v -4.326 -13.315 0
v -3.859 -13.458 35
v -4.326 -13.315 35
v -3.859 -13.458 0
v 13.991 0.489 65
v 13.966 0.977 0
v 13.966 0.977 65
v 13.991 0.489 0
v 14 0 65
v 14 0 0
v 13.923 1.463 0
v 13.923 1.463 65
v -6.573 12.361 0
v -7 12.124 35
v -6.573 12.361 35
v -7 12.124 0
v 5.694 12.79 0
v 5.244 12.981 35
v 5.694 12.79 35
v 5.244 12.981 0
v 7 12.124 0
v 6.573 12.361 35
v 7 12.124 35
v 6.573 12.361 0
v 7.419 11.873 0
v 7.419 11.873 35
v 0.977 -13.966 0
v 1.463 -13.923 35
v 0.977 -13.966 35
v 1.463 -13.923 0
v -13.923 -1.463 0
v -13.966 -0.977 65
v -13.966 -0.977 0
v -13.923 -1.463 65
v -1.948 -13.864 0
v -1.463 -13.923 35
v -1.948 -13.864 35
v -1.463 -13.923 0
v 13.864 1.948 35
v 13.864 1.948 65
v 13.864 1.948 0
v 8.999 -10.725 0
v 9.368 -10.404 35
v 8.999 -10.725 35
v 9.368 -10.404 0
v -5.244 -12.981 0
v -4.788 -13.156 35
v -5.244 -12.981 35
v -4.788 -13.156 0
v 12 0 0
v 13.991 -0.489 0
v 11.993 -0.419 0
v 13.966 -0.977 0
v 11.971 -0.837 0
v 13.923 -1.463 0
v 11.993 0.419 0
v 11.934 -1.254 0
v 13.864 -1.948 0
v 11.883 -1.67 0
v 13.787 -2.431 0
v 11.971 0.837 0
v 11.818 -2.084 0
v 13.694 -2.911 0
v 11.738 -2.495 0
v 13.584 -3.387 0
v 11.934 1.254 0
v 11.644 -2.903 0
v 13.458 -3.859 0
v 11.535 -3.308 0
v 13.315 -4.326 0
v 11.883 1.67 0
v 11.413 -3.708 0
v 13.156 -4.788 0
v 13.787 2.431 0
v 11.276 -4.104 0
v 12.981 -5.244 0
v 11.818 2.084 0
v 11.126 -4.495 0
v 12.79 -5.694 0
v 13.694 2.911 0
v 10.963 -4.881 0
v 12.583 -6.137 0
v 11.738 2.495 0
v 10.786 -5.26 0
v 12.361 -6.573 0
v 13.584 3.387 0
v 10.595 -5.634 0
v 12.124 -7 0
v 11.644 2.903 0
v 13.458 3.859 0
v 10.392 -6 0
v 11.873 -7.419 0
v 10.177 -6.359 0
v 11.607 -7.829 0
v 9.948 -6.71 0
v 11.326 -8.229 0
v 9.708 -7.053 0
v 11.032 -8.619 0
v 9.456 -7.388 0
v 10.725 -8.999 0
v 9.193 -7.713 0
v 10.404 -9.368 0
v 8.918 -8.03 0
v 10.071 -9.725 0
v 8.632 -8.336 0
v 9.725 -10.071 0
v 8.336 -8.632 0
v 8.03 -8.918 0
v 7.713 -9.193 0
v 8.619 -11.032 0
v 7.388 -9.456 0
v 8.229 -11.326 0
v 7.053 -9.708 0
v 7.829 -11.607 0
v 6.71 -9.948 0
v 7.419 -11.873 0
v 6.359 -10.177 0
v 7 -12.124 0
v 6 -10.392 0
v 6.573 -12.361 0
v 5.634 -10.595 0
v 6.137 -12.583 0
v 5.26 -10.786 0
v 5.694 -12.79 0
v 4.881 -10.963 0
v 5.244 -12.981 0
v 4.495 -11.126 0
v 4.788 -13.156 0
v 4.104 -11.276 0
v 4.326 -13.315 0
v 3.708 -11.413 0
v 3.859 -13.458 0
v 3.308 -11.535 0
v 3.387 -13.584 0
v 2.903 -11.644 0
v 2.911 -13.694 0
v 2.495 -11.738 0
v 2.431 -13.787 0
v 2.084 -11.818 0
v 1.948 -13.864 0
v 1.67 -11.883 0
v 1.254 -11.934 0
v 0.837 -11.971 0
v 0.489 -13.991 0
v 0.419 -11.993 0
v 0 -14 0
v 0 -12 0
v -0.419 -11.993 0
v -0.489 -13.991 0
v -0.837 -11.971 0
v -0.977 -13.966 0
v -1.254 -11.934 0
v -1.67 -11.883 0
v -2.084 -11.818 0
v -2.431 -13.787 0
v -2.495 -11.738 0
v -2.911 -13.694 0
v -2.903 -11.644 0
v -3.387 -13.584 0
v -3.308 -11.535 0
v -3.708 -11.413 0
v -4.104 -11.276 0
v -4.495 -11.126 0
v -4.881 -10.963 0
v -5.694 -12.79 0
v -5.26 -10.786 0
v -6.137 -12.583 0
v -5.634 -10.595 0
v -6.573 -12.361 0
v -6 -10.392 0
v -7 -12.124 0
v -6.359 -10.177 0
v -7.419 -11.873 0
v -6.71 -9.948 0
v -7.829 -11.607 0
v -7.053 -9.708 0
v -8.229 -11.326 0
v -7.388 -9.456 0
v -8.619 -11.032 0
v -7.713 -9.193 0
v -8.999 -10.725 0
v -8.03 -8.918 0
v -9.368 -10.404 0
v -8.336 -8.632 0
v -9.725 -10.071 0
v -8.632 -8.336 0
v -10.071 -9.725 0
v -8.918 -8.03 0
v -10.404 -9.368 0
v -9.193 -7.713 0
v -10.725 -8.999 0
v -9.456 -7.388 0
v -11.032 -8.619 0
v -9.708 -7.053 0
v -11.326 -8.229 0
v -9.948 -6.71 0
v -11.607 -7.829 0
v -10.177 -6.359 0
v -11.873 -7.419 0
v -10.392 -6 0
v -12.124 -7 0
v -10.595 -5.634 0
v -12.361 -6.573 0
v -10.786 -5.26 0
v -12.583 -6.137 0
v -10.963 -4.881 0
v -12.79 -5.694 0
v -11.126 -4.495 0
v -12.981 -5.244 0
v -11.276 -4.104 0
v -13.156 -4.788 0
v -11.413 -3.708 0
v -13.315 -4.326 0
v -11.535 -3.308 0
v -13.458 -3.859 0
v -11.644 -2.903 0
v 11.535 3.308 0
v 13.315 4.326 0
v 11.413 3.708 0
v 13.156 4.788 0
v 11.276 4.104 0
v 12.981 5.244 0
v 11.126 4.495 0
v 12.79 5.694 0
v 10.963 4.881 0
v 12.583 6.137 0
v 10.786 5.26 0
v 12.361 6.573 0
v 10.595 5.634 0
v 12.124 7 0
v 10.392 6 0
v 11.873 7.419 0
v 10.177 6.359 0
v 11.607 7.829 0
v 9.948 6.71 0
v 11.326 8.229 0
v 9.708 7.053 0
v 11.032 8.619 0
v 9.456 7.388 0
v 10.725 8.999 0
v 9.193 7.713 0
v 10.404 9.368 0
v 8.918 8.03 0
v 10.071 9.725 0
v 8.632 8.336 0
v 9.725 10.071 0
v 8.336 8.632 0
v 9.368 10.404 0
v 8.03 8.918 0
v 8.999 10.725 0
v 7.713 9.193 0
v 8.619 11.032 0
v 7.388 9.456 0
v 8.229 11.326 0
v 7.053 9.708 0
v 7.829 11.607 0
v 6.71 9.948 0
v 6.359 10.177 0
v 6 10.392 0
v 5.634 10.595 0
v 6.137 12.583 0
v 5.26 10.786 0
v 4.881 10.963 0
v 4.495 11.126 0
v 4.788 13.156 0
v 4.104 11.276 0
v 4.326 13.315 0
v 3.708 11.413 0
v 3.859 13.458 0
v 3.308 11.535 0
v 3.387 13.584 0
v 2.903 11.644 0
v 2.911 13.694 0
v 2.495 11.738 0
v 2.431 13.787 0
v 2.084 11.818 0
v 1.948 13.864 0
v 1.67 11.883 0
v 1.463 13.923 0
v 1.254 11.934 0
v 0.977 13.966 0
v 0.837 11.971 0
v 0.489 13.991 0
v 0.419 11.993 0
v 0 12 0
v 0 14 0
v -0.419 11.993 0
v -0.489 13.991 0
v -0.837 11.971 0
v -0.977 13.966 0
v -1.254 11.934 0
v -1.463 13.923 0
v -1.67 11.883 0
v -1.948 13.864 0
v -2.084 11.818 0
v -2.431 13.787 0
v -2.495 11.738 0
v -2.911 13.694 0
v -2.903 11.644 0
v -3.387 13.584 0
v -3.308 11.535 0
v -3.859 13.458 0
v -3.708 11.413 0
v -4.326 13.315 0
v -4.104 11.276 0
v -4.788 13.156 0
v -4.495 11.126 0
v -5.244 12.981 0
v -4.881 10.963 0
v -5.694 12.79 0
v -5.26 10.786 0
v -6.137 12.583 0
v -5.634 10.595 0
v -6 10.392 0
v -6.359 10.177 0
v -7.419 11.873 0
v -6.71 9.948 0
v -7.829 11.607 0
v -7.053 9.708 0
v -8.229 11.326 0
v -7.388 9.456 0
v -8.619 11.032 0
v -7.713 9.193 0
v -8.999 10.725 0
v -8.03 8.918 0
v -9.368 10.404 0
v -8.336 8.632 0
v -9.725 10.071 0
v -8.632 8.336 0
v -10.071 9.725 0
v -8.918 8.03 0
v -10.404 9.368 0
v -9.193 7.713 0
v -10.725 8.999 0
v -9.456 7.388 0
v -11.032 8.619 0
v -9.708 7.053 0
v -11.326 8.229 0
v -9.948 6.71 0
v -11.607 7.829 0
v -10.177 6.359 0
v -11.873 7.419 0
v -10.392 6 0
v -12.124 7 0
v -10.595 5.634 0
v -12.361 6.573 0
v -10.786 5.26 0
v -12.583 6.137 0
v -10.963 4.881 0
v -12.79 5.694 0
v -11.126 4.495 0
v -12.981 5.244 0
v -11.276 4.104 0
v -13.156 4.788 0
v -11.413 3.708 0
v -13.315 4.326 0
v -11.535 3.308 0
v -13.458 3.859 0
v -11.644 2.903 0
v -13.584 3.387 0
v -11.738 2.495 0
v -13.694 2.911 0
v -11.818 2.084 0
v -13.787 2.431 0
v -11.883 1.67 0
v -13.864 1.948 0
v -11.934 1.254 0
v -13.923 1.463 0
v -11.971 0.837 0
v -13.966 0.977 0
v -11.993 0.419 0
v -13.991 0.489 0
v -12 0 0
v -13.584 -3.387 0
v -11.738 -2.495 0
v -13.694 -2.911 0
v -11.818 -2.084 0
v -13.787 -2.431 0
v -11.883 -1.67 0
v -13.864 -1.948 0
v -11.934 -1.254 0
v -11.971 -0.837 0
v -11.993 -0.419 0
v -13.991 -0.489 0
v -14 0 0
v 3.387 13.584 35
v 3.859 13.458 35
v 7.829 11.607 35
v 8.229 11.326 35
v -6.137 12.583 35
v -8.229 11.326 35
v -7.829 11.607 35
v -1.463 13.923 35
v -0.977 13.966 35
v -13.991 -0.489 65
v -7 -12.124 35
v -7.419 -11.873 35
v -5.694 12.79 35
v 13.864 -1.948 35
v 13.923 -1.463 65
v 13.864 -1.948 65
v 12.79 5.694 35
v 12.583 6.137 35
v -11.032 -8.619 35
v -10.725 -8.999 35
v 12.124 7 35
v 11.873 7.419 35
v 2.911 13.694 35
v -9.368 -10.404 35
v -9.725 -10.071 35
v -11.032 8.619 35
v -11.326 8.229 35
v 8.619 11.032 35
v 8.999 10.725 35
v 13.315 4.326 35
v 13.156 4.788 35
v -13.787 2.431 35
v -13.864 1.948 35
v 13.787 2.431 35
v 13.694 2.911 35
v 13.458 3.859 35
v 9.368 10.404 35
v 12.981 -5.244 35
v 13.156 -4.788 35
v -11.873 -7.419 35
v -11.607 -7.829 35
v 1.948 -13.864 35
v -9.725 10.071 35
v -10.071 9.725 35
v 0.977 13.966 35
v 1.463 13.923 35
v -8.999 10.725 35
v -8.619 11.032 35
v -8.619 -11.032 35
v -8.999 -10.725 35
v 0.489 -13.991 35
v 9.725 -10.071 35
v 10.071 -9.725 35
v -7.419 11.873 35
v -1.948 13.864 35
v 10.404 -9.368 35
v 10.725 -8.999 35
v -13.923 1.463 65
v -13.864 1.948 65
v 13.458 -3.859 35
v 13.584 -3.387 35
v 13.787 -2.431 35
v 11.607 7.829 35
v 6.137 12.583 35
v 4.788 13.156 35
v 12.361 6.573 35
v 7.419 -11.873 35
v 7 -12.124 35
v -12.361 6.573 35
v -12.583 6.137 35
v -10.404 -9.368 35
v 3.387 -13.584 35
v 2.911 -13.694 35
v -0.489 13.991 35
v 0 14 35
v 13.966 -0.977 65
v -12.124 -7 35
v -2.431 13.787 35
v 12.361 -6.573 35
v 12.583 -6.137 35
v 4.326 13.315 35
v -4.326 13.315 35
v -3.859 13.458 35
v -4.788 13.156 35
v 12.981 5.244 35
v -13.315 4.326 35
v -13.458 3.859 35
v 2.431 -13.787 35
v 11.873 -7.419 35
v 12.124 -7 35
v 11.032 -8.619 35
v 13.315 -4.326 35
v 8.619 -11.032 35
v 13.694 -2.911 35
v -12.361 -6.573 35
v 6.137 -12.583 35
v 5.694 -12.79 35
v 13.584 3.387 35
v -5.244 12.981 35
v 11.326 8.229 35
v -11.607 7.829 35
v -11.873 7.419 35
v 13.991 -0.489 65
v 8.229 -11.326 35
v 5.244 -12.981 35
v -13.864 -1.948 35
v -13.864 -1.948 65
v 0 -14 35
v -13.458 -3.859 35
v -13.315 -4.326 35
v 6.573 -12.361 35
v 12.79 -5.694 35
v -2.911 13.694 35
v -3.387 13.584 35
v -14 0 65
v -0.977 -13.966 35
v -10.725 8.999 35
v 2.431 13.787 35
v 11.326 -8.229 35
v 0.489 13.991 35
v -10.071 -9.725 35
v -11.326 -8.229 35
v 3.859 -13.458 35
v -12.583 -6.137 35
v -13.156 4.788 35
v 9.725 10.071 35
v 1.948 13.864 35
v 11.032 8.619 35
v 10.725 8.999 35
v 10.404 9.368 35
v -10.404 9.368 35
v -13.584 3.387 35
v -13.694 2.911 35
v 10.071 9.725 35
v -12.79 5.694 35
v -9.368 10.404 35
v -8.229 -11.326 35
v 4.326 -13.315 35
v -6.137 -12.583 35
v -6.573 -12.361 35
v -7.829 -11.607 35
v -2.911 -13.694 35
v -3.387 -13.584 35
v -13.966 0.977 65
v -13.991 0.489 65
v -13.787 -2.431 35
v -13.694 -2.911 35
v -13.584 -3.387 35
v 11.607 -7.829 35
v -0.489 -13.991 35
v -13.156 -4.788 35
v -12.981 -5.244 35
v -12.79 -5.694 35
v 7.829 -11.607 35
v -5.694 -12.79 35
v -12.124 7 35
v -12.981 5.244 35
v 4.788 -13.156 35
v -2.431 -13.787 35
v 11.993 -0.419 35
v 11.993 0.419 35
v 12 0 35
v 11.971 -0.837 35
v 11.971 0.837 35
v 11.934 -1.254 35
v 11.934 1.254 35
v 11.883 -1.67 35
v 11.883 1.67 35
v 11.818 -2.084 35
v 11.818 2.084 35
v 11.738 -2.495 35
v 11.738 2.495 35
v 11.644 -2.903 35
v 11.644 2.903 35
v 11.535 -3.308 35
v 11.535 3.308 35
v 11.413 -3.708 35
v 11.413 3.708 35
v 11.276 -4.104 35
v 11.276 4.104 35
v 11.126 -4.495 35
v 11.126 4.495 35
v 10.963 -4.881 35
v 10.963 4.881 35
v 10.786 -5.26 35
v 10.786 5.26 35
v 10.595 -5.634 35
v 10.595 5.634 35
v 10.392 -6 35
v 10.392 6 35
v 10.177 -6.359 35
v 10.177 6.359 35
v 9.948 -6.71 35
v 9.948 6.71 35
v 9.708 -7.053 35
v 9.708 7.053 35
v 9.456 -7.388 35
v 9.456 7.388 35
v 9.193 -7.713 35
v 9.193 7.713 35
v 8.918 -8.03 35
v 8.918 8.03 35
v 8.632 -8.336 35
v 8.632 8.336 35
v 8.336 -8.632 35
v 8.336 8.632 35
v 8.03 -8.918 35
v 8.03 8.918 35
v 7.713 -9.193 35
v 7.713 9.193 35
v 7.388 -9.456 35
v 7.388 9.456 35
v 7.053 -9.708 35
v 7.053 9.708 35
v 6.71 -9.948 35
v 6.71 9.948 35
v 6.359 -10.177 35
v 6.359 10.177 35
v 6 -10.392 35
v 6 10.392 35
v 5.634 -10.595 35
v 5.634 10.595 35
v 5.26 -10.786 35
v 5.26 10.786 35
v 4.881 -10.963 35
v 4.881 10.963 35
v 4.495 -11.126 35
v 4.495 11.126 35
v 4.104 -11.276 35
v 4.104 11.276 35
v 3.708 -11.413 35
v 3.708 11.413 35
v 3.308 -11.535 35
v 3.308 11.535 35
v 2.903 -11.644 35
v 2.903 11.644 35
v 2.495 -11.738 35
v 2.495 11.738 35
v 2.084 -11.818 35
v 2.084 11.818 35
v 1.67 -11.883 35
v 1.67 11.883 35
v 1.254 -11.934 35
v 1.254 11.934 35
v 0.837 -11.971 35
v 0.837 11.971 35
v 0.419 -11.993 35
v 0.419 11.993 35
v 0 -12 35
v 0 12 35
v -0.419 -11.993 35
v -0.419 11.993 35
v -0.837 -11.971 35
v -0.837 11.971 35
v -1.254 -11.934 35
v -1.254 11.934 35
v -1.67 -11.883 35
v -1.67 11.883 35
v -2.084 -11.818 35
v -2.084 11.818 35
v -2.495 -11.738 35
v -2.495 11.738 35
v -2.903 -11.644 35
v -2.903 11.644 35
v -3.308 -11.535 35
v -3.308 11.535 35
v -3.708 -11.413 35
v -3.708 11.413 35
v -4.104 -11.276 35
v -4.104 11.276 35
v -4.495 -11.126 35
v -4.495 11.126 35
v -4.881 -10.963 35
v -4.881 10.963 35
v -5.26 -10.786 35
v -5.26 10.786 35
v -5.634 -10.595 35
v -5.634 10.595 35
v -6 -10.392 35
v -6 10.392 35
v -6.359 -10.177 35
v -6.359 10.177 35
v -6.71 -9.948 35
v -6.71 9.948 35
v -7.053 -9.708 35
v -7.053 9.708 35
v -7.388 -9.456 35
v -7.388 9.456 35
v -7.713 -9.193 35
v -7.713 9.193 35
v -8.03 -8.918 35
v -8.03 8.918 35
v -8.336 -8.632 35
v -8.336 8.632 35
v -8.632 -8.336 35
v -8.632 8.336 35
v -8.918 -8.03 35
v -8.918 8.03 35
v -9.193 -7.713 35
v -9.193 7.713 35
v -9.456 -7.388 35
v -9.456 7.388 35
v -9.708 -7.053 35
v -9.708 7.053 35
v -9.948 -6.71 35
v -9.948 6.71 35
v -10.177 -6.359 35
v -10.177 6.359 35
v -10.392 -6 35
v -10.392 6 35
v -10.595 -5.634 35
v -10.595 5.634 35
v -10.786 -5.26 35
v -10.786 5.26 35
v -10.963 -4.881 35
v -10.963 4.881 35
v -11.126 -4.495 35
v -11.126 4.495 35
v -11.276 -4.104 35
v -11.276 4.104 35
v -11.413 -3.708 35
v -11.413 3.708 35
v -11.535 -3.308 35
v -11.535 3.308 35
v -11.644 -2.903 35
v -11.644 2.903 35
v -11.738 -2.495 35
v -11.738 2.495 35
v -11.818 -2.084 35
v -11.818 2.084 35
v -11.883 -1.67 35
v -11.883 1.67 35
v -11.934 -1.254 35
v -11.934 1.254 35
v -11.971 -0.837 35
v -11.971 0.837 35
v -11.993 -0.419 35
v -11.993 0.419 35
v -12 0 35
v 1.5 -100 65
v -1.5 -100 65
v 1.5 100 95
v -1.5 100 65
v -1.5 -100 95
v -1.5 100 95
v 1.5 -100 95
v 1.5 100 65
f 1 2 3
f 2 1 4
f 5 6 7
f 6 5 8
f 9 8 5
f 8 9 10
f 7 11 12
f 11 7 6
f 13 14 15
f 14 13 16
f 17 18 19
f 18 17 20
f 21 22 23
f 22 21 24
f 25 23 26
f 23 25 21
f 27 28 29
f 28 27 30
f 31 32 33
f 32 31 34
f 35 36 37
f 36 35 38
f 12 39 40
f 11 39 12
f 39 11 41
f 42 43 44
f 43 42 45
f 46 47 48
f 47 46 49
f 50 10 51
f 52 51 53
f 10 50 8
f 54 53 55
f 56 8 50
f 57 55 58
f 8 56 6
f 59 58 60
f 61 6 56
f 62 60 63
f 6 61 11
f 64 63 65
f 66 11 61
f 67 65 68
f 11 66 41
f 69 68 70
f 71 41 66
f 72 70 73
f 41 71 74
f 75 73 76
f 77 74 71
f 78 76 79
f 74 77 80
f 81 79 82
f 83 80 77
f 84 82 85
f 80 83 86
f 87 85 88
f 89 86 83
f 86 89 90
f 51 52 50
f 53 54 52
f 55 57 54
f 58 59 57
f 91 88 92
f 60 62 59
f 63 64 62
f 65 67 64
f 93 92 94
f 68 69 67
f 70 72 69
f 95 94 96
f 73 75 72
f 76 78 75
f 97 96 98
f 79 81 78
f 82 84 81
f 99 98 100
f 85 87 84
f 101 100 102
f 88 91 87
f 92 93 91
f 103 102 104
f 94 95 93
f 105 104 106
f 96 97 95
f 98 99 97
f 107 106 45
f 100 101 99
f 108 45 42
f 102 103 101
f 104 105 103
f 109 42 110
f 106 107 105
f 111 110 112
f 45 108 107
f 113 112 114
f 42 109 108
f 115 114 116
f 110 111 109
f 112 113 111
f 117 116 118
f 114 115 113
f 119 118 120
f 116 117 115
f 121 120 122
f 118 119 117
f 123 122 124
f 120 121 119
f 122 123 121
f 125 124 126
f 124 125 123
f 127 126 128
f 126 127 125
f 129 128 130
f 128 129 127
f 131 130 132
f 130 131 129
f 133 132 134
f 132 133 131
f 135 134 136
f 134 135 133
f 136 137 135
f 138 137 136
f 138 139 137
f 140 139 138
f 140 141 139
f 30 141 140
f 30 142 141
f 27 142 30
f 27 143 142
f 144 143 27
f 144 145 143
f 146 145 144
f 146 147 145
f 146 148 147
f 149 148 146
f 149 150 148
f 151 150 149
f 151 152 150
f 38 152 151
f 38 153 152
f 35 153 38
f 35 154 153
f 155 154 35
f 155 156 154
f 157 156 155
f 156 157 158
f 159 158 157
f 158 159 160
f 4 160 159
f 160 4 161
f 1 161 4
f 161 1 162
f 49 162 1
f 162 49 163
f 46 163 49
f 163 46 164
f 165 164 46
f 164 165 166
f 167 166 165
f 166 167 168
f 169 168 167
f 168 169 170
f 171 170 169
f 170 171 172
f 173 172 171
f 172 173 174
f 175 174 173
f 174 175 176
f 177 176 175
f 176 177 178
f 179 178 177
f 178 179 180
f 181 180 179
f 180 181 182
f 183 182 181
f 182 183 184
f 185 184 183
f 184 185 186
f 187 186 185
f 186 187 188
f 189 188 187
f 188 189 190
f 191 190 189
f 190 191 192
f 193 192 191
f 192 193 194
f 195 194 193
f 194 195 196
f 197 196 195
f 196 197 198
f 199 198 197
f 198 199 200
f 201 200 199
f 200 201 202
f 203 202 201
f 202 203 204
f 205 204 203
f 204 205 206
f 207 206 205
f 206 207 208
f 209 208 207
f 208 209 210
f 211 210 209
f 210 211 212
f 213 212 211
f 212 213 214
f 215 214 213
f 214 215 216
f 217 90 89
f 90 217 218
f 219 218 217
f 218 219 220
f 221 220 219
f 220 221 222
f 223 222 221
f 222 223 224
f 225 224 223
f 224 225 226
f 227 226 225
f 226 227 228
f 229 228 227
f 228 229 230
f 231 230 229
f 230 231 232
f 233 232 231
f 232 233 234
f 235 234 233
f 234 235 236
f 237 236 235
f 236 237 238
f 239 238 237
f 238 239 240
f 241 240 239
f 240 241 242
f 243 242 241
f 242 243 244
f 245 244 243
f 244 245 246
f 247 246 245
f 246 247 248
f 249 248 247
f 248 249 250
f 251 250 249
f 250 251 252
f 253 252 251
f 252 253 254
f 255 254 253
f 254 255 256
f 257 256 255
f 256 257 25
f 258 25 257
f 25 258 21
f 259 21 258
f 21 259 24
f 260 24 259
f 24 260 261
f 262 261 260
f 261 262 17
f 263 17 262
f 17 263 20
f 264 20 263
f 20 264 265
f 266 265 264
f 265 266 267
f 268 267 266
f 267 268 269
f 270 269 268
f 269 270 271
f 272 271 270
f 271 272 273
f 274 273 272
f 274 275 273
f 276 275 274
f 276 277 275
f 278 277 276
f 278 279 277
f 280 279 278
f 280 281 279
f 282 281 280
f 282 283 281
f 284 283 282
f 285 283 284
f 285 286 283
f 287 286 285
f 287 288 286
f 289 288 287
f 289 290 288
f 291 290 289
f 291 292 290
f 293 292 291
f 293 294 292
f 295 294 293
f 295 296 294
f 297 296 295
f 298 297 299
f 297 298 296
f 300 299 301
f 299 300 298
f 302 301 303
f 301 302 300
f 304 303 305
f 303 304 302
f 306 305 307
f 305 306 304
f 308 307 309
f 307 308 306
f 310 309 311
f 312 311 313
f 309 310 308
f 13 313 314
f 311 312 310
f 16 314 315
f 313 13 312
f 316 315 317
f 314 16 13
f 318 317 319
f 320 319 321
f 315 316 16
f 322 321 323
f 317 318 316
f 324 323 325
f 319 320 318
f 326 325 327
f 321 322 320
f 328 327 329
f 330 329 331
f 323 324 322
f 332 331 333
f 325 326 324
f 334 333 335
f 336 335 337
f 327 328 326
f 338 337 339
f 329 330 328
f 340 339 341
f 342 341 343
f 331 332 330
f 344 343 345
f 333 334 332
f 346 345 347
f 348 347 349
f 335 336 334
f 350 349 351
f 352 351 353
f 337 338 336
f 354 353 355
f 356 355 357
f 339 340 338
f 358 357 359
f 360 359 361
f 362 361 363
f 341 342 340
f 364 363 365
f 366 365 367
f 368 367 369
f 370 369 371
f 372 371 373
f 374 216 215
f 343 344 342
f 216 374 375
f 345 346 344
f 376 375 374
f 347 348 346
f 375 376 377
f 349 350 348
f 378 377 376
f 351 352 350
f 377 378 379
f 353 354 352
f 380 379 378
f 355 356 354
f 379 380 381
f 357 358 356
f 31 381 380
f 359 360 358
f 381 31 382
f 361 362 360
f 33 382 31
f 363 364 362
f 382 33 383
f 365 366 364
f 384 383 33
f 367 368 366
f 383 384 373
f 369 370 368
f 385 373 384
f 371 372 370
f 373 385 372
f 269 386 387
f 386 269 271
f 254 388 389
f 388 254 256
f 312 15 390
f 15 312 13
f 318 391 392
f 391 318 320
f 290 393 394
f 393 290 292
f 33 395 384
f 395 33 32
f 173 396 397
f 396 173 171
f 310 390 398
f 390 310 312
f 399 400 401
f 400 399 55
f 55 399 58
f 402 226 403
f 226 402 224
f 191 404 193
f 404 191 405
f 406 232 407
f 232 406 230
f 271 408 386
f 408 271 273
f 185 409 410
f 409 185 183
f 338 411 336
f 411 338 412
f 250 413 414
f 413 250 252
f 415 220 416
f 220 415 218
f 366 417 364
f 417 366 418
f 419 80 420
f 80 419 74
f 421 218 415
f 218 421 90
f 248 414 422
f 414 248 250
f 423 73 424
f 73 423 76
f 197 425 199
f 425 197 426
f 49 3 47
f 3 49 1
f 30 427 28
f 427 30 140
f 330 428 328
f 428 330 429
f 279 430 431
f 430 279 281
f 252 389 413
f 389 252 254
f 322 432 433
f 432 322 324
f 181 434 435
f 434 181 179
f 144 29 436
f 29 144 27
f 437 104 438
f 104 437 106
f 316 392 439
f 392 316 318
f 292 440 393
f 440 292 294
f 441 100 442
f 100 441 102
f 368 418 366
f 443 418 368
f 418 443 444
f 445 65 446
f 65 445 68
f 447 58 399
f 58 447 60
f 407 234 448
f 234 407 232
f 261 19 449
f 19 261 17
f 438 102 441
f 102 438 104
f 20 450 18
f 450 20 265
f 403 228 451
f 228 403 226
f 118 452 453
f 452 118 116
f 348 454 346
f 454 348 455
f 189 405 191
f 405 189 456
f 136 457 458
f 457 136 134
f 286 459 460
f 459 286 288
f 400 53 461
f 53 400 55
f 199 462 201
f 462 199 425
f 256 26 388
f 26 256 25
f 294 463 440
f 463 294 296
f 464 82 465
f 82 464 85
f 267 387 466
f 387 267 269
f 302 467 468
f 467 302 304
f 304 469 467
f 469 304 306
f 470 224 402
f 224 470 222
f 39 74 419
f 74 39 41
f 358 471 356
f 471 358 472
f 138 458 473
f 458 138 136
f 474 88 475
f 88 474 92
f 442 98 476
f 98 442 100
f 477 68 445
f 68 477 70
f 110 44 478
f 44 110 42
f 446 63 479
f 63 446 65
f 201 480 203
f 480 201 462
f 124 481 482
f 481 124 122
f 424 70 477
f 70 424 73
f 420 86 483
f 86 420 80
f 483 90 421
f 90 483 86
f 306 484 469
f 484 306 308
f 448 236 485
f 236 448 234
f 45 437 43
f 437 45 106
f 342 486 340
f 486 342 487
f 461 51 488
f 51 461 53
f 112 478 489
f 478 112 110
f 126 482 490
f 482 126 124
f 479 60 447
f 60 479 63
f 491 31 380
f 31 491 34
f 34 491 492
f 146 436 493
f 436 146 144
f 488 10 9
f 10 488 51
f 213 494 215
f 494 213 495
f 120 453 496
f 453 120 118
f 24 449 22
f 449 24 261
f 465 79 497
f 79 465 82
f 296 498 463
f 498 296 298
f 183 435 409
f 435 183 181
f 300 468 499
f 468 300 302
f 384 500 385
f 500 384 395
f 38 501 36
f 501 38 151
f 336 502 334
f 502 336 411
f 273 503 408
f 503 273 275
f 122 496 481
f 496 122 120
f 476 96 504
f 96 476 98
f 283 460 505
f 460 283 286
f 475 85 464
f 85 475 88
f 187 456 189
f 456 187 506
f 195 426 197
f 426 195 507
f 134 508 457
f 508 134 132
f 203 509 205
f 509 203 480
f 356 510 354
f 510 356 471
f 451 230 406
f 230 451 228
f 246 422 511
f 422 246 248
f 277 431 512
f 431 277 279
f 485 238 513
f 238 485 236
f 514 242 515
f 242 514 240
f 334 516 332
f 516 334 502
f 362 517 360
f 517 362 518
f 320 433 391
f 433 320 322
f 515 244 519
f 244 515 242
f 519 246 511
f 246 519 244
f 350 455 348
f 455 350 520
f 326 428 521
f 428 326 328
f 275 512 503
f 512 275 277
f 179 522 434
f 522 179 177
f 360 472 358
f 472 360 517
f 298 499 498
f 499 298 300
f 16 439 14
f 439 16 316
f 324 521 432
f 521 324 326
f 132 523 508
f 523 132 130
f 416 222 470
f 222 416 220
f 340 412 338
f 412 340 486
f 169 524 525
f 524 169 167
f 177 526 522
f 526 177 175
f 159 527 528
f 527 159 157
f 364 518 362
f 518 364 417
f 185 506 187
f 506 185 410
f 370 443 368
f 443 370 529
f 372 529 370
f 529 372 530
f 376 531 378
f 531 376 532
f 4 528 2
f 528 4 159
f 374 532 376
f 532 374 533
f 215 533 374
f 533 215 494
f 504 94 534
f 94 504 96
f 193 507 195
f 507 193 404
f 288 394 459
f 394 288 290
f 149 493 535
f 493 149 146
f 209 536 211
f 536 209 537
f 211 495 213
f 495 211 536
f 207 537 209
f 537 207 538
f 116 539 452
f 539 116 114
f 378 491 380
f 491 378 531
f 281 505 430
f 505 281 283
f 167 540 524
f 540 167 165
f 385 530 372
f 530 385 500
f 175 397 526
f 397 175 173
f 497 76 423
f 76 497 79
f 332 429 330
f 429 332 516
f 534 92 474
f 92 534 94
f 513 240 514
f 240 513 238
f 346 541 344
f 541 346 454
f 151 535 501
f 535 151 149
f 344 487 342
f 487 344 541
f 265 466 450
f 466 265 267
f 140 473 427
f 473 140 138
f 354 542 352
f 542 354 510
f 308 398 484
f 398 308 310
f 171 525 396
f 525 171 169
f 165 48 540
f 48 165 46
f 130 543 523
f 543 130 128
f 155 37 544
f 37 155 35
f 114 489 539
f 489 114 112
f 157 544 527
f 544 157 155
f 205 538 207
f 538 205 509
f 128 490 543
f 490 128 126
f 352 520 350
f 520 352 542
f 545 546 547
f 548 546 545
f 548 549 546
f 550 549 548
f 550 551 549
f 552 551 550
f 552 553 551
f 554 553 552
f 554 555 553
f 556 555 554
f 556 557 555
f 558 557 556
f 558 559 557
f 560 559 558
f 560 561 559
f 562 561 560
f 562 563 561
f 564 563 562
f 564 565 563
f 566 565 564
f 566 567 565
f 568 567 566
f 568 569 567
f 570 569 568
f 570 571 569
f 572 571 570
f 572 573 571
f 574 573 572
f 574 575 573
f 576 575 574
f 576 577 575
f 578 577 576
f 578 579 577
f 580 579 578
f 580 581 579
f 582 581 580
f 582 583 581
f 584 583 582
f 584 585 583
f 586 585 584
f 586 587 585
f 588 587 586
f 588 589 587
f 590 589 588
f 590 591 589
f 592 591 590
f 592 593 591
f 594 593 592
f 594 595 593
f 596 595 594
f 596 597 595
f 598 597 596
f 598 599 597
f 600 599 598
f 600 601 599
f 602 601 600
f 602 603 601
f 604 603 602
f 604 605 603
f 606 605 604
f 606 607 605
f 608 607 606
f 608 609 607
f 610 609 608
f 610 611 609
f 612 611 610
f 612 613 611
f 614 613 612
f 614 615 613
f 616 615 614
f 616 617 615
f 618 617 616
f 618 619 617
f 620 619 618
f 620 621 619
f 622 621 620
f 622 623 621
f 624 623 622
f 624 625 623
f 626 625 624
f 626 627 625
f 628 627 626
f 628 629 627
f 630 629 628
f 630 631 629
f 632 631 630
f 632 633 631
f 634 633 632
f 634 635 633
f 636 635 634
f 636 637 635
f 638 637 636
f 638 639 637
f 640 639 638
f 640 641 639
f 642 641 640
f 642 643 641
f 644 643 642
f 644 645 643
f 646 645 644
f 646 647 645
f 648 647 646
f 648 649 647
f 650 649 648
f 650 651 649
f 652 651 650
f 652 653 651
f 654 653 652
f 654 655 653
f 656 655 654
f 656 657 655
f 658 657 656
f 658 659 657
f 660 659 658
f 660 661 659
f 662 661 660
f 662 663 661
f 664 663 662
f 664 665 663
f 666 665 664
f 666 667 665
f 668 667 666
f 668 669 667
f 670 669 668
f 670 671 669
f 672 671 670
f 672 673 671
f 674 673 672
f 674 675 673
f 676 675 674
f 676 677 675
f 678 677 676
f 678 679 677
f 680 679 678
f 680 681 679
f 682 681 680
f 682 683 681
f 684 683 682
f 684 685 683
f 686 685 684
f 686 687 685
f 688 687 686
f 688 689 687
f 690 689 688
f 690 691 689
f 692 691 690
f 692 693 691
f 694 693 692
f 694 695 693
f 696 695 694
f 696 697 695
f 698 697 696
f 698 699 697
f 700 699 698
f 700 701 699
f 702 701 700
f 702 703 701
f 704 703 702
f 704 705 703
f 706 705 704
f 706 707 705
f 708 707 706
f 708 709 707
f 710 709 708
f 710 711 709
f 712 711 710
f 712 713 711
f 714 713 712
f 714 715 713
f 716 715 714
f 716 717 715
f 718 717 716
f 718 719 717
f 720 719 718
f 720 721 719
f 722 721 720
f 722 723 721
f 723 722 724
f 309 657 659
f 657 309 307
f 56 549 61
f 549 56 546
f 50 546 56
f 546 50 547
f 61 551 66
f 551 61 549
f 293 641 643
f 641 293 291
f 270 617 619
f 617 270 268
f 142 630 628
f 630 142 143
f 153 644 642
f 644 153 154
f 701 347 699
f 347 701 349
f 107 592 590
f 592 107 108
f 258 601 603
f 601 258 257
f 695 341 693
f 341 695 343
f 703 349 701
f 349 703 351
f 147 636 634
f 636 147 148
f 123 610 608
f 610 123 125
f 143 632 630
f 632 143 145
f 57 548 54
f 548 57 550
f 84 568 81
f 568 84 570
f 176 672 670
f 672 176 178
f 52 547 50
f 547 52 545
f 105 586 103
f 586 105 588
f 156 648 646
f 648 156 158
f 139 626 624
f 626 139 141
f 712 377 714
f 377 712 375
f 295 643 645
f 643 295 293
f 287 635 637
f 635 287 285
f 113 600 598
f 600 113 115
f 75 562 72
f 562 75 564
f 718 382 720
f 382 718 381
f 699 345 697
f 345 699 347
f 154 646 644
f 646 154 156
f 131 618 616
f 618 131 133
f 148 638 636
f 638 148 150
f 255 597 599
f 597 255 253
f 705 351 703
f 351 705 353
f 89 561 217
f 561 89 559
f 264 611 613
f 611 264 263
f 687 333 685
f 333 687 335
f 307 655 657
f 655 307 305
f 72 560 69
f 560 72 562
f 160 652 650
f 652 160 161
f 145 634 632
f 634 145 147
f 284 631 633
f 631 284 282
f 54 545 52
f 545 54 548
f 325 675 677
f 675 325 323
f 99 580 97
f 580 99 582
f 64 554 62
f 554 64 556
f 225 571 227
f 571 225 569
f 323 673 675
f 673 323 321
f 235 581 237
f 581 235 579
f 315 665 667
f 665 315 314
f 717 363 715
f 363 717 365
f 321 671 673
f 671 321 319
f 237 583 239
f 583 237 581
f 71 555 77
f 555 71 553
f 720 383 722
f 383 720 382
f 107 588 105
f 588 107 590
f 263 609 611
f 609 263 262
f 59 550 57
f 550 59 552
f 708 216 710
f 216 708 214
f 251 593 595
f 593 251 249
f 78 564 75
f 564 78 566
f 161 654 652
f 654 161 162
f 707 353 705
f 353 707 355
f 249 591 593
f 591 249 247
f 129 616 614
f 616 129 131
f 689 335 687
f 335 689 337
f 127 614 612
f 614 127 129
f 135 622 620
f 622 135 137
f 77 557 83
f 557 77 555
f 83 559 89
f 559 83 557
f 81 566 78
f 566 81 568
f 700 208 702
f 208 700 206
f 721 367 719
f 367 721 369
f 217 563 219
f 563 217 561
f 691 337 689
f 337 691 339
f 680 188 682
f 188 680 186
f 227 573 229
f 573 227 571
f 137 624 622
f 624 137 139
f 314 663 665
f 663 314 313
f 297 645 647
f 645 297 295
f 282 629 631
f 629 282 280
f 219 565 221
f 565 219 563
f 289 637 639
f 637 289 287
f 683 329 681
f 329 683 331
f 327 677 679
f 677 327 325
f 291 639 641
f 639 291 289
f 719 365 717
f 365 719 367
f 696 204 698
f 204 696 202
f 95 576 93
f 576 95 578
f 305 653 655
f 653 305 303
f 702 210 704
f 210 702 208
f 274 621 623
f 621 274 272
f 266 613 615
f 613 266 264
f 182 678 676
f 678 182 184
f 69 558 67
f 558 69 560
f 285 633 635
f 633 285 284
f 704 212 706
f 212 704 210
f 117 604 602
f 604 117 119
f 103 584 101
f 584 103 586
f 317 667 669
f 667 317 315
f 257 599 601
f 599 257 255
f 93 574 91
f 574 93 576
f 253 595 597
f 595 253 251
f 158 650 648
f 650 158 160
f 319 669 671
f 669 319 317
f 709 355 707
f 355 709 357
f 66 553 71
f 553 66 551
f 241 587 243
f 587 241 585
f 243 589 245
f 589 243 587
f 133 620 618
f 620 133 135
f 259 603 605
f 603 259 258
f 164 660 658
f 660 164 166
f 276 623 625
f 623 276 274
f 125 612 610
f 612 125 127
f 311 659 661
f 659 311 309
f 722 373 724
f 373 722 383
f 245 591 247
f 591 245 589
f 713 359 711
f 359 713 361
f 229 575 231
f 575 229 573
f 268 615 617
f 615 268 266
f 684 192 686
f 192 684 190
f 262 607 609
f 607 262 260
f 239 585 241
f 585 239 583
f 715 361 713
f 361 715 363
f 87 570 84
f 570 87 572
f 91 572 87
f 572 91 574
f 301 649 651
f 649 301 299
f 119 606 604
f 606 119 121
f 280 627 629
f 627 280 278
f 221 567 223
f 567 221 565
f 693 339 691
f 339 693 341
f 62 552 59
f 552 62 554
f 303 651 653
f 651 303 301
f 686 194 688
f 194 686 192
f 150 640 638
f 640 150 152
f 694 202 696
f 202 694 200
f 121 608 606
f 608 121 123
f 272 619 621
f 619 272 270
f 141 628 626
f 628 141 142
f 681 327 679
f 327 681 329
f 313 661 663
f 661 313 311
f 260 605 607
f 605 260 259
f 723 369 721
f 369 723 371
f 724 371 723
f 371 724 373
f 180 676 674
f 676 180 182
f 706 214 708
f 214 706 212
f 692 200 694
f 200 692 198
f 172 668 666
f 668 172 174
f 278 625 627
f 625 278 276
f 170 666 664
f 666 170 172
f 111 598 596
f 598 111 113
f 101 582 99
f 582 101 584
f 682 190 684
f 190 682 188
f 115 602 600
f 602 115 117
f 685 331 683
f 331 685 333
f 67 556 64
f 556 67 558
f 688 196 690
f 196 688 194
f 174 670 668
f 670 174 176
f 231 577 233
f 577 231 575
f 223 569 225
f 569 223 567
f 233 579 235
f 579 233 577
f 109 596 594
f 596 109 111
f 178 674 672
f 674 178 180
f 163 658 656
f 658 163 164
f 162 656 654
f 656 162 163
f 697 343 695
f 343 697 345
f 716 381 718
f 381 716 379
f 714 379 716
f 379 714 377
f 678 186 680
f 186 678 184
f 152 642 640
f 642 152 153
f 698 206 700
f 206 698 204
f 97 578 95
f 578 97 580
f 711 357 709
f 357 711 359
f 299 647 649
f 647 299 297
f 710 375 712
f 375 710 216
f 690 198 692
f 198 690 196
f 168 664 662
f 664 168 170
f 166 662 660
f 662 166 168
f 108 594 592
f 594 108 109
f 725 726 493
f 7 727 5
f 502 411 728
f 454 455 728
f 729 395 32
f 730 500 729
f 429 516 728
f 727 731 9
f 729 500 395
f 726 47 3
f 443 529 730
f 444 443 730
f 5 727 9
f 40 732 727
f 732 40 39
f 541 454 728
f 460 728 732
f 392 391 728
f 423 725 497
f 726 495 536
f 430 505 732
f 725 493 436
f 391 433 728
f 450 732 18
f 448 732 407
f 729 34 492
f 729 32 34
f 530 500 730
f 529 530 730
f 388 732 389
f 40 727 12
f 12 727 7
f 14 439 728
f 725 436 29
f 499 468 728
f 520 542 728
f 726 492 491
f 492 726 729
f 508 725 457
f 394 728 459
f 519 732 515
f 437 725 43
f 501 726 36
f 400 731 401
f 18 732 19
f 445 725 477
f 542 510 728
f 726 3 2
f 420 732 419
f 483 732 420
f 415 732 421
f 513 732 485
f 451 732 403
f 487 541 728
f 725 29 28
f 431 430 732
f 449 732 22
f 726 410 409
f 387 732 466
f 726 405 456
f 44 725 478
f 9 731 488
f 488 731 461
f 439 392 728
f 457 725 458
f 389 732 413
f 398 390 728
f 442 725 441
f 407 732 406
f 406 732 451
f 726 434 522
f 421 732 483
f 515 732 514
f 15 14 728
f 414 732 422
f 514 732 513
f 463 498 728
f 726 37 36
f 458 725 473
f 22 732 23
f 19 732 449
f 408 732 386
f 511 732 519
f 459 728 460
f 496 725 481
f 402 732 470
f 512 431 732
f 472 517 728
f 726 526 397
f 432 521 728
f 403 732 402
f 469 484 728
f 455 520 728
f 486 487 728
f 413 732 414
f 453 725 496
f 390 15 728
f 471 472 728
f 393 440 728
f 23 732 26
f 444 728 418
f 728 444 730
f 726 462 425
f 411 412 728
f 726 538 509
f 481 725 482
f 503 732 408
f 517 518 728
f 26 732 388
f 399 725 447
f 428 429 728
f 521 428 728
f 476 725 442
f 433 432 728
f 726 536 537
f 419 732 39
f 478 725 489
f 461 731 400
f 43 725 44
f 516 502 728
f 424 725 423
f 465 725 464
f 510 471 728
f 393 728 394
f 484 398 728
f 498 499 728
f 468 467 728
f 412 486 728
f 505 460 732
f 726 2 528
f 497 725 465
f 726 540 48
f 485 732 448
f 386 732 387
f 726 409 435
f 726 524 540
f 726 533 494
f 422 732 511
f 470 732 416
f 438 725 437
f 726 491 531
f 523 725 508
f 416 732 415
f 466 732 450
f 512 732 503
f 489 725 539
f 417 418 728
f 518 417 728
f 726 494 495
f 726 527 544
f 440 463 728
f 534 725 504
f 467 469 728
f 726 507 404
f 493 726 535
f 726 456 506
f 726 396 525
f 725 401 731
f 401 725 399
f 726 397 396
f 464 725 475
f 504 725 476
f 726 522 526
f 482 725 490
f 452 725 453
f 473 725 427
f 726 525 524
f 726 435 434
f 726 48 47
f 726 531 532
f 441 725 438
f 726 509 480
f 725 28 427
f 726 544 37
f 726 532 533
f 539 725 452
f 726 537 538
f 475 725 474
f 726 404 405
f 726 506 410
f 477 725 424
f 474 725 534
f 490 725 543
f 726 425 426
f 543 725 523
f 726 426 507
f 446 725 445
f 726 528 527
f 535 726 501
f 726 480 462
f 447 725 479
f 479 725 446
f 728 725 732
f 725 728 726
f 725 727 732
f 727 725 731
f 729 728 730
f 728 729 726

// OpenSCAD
cross_file = "/Users/evansutherland/Documents/Models/methodist-cross.png";
flame_file = "/Users/evansutherland/Documents/Models/methodist-flame.png";
logo_size = 100;        // size of logo (will fit within this dimension)
cross_depth = 2;      // how deep to engrave cross (mm)
flame_depth = 1;      // how deep to engrave flame (mm)

post_diameter=24;
sleeve_thickness=2;
sleeve_height=35;
backboard_thickness=3;
backboard_width=200;
backboard_height=200;
transition_height=60;
$fn=180;

difference() {
  union() {
    sleeve();
    translate([0, 0, sleeve_height])
    transition();
  }
  translate([0, 0, sleeve_height + transition_height/2])
  backboard();
}

// translate([0, 0, 100])
// backboard(with_logo = true);

module sleeve(height = sleeve_height) {
  difference() {
    cylinder(h=height, d=post_diameter + sleeve_thickness*2);
    cylinder(h=height, d=post_diameter);
  }
}

module transition() {
  hull() {
    sleeve(transition_height/2);
    translate([0, 0, transition_height/2])
    backboard(transition_height/2);
  }
}

module backboard(height = backboard_height, with_logo = false) {
  difference() {
    translate([0, 0, height/2])
    rotate([0, 90, 0])
    cube([height, backboard_width, backboard_thickness], center=true);

    // if (with_logo) {
    //   // Position logos on front face, centered on backboard
    //   translate([backboard_thickness/2, 0, height/2])
    //   rotate([0, 90, 0])
    //   rotate([0, 0, 90]) {
    //     logo(cross_file, cross_depth);
    //     logo(flame_file, flame_depth);
    //   }
    // }
  }
}

module logo(file, depth) {
  // Image dimensions (update these to match your PNG)
  img_width = 300;
  img_height = 300;

  // Scale factor to fit logo_size, height values in surface() range 0-100
  scale_xy = logo_size / max(img_width, img_height);
  scale_z = depth / 100;  // surface() outputs 0-100 height

  scale([scale_xy, scale_xy, scale_z])
  translate([-img_width/2, -img_height/2, 0])
  surface(file, center=false, invert=true);
}
